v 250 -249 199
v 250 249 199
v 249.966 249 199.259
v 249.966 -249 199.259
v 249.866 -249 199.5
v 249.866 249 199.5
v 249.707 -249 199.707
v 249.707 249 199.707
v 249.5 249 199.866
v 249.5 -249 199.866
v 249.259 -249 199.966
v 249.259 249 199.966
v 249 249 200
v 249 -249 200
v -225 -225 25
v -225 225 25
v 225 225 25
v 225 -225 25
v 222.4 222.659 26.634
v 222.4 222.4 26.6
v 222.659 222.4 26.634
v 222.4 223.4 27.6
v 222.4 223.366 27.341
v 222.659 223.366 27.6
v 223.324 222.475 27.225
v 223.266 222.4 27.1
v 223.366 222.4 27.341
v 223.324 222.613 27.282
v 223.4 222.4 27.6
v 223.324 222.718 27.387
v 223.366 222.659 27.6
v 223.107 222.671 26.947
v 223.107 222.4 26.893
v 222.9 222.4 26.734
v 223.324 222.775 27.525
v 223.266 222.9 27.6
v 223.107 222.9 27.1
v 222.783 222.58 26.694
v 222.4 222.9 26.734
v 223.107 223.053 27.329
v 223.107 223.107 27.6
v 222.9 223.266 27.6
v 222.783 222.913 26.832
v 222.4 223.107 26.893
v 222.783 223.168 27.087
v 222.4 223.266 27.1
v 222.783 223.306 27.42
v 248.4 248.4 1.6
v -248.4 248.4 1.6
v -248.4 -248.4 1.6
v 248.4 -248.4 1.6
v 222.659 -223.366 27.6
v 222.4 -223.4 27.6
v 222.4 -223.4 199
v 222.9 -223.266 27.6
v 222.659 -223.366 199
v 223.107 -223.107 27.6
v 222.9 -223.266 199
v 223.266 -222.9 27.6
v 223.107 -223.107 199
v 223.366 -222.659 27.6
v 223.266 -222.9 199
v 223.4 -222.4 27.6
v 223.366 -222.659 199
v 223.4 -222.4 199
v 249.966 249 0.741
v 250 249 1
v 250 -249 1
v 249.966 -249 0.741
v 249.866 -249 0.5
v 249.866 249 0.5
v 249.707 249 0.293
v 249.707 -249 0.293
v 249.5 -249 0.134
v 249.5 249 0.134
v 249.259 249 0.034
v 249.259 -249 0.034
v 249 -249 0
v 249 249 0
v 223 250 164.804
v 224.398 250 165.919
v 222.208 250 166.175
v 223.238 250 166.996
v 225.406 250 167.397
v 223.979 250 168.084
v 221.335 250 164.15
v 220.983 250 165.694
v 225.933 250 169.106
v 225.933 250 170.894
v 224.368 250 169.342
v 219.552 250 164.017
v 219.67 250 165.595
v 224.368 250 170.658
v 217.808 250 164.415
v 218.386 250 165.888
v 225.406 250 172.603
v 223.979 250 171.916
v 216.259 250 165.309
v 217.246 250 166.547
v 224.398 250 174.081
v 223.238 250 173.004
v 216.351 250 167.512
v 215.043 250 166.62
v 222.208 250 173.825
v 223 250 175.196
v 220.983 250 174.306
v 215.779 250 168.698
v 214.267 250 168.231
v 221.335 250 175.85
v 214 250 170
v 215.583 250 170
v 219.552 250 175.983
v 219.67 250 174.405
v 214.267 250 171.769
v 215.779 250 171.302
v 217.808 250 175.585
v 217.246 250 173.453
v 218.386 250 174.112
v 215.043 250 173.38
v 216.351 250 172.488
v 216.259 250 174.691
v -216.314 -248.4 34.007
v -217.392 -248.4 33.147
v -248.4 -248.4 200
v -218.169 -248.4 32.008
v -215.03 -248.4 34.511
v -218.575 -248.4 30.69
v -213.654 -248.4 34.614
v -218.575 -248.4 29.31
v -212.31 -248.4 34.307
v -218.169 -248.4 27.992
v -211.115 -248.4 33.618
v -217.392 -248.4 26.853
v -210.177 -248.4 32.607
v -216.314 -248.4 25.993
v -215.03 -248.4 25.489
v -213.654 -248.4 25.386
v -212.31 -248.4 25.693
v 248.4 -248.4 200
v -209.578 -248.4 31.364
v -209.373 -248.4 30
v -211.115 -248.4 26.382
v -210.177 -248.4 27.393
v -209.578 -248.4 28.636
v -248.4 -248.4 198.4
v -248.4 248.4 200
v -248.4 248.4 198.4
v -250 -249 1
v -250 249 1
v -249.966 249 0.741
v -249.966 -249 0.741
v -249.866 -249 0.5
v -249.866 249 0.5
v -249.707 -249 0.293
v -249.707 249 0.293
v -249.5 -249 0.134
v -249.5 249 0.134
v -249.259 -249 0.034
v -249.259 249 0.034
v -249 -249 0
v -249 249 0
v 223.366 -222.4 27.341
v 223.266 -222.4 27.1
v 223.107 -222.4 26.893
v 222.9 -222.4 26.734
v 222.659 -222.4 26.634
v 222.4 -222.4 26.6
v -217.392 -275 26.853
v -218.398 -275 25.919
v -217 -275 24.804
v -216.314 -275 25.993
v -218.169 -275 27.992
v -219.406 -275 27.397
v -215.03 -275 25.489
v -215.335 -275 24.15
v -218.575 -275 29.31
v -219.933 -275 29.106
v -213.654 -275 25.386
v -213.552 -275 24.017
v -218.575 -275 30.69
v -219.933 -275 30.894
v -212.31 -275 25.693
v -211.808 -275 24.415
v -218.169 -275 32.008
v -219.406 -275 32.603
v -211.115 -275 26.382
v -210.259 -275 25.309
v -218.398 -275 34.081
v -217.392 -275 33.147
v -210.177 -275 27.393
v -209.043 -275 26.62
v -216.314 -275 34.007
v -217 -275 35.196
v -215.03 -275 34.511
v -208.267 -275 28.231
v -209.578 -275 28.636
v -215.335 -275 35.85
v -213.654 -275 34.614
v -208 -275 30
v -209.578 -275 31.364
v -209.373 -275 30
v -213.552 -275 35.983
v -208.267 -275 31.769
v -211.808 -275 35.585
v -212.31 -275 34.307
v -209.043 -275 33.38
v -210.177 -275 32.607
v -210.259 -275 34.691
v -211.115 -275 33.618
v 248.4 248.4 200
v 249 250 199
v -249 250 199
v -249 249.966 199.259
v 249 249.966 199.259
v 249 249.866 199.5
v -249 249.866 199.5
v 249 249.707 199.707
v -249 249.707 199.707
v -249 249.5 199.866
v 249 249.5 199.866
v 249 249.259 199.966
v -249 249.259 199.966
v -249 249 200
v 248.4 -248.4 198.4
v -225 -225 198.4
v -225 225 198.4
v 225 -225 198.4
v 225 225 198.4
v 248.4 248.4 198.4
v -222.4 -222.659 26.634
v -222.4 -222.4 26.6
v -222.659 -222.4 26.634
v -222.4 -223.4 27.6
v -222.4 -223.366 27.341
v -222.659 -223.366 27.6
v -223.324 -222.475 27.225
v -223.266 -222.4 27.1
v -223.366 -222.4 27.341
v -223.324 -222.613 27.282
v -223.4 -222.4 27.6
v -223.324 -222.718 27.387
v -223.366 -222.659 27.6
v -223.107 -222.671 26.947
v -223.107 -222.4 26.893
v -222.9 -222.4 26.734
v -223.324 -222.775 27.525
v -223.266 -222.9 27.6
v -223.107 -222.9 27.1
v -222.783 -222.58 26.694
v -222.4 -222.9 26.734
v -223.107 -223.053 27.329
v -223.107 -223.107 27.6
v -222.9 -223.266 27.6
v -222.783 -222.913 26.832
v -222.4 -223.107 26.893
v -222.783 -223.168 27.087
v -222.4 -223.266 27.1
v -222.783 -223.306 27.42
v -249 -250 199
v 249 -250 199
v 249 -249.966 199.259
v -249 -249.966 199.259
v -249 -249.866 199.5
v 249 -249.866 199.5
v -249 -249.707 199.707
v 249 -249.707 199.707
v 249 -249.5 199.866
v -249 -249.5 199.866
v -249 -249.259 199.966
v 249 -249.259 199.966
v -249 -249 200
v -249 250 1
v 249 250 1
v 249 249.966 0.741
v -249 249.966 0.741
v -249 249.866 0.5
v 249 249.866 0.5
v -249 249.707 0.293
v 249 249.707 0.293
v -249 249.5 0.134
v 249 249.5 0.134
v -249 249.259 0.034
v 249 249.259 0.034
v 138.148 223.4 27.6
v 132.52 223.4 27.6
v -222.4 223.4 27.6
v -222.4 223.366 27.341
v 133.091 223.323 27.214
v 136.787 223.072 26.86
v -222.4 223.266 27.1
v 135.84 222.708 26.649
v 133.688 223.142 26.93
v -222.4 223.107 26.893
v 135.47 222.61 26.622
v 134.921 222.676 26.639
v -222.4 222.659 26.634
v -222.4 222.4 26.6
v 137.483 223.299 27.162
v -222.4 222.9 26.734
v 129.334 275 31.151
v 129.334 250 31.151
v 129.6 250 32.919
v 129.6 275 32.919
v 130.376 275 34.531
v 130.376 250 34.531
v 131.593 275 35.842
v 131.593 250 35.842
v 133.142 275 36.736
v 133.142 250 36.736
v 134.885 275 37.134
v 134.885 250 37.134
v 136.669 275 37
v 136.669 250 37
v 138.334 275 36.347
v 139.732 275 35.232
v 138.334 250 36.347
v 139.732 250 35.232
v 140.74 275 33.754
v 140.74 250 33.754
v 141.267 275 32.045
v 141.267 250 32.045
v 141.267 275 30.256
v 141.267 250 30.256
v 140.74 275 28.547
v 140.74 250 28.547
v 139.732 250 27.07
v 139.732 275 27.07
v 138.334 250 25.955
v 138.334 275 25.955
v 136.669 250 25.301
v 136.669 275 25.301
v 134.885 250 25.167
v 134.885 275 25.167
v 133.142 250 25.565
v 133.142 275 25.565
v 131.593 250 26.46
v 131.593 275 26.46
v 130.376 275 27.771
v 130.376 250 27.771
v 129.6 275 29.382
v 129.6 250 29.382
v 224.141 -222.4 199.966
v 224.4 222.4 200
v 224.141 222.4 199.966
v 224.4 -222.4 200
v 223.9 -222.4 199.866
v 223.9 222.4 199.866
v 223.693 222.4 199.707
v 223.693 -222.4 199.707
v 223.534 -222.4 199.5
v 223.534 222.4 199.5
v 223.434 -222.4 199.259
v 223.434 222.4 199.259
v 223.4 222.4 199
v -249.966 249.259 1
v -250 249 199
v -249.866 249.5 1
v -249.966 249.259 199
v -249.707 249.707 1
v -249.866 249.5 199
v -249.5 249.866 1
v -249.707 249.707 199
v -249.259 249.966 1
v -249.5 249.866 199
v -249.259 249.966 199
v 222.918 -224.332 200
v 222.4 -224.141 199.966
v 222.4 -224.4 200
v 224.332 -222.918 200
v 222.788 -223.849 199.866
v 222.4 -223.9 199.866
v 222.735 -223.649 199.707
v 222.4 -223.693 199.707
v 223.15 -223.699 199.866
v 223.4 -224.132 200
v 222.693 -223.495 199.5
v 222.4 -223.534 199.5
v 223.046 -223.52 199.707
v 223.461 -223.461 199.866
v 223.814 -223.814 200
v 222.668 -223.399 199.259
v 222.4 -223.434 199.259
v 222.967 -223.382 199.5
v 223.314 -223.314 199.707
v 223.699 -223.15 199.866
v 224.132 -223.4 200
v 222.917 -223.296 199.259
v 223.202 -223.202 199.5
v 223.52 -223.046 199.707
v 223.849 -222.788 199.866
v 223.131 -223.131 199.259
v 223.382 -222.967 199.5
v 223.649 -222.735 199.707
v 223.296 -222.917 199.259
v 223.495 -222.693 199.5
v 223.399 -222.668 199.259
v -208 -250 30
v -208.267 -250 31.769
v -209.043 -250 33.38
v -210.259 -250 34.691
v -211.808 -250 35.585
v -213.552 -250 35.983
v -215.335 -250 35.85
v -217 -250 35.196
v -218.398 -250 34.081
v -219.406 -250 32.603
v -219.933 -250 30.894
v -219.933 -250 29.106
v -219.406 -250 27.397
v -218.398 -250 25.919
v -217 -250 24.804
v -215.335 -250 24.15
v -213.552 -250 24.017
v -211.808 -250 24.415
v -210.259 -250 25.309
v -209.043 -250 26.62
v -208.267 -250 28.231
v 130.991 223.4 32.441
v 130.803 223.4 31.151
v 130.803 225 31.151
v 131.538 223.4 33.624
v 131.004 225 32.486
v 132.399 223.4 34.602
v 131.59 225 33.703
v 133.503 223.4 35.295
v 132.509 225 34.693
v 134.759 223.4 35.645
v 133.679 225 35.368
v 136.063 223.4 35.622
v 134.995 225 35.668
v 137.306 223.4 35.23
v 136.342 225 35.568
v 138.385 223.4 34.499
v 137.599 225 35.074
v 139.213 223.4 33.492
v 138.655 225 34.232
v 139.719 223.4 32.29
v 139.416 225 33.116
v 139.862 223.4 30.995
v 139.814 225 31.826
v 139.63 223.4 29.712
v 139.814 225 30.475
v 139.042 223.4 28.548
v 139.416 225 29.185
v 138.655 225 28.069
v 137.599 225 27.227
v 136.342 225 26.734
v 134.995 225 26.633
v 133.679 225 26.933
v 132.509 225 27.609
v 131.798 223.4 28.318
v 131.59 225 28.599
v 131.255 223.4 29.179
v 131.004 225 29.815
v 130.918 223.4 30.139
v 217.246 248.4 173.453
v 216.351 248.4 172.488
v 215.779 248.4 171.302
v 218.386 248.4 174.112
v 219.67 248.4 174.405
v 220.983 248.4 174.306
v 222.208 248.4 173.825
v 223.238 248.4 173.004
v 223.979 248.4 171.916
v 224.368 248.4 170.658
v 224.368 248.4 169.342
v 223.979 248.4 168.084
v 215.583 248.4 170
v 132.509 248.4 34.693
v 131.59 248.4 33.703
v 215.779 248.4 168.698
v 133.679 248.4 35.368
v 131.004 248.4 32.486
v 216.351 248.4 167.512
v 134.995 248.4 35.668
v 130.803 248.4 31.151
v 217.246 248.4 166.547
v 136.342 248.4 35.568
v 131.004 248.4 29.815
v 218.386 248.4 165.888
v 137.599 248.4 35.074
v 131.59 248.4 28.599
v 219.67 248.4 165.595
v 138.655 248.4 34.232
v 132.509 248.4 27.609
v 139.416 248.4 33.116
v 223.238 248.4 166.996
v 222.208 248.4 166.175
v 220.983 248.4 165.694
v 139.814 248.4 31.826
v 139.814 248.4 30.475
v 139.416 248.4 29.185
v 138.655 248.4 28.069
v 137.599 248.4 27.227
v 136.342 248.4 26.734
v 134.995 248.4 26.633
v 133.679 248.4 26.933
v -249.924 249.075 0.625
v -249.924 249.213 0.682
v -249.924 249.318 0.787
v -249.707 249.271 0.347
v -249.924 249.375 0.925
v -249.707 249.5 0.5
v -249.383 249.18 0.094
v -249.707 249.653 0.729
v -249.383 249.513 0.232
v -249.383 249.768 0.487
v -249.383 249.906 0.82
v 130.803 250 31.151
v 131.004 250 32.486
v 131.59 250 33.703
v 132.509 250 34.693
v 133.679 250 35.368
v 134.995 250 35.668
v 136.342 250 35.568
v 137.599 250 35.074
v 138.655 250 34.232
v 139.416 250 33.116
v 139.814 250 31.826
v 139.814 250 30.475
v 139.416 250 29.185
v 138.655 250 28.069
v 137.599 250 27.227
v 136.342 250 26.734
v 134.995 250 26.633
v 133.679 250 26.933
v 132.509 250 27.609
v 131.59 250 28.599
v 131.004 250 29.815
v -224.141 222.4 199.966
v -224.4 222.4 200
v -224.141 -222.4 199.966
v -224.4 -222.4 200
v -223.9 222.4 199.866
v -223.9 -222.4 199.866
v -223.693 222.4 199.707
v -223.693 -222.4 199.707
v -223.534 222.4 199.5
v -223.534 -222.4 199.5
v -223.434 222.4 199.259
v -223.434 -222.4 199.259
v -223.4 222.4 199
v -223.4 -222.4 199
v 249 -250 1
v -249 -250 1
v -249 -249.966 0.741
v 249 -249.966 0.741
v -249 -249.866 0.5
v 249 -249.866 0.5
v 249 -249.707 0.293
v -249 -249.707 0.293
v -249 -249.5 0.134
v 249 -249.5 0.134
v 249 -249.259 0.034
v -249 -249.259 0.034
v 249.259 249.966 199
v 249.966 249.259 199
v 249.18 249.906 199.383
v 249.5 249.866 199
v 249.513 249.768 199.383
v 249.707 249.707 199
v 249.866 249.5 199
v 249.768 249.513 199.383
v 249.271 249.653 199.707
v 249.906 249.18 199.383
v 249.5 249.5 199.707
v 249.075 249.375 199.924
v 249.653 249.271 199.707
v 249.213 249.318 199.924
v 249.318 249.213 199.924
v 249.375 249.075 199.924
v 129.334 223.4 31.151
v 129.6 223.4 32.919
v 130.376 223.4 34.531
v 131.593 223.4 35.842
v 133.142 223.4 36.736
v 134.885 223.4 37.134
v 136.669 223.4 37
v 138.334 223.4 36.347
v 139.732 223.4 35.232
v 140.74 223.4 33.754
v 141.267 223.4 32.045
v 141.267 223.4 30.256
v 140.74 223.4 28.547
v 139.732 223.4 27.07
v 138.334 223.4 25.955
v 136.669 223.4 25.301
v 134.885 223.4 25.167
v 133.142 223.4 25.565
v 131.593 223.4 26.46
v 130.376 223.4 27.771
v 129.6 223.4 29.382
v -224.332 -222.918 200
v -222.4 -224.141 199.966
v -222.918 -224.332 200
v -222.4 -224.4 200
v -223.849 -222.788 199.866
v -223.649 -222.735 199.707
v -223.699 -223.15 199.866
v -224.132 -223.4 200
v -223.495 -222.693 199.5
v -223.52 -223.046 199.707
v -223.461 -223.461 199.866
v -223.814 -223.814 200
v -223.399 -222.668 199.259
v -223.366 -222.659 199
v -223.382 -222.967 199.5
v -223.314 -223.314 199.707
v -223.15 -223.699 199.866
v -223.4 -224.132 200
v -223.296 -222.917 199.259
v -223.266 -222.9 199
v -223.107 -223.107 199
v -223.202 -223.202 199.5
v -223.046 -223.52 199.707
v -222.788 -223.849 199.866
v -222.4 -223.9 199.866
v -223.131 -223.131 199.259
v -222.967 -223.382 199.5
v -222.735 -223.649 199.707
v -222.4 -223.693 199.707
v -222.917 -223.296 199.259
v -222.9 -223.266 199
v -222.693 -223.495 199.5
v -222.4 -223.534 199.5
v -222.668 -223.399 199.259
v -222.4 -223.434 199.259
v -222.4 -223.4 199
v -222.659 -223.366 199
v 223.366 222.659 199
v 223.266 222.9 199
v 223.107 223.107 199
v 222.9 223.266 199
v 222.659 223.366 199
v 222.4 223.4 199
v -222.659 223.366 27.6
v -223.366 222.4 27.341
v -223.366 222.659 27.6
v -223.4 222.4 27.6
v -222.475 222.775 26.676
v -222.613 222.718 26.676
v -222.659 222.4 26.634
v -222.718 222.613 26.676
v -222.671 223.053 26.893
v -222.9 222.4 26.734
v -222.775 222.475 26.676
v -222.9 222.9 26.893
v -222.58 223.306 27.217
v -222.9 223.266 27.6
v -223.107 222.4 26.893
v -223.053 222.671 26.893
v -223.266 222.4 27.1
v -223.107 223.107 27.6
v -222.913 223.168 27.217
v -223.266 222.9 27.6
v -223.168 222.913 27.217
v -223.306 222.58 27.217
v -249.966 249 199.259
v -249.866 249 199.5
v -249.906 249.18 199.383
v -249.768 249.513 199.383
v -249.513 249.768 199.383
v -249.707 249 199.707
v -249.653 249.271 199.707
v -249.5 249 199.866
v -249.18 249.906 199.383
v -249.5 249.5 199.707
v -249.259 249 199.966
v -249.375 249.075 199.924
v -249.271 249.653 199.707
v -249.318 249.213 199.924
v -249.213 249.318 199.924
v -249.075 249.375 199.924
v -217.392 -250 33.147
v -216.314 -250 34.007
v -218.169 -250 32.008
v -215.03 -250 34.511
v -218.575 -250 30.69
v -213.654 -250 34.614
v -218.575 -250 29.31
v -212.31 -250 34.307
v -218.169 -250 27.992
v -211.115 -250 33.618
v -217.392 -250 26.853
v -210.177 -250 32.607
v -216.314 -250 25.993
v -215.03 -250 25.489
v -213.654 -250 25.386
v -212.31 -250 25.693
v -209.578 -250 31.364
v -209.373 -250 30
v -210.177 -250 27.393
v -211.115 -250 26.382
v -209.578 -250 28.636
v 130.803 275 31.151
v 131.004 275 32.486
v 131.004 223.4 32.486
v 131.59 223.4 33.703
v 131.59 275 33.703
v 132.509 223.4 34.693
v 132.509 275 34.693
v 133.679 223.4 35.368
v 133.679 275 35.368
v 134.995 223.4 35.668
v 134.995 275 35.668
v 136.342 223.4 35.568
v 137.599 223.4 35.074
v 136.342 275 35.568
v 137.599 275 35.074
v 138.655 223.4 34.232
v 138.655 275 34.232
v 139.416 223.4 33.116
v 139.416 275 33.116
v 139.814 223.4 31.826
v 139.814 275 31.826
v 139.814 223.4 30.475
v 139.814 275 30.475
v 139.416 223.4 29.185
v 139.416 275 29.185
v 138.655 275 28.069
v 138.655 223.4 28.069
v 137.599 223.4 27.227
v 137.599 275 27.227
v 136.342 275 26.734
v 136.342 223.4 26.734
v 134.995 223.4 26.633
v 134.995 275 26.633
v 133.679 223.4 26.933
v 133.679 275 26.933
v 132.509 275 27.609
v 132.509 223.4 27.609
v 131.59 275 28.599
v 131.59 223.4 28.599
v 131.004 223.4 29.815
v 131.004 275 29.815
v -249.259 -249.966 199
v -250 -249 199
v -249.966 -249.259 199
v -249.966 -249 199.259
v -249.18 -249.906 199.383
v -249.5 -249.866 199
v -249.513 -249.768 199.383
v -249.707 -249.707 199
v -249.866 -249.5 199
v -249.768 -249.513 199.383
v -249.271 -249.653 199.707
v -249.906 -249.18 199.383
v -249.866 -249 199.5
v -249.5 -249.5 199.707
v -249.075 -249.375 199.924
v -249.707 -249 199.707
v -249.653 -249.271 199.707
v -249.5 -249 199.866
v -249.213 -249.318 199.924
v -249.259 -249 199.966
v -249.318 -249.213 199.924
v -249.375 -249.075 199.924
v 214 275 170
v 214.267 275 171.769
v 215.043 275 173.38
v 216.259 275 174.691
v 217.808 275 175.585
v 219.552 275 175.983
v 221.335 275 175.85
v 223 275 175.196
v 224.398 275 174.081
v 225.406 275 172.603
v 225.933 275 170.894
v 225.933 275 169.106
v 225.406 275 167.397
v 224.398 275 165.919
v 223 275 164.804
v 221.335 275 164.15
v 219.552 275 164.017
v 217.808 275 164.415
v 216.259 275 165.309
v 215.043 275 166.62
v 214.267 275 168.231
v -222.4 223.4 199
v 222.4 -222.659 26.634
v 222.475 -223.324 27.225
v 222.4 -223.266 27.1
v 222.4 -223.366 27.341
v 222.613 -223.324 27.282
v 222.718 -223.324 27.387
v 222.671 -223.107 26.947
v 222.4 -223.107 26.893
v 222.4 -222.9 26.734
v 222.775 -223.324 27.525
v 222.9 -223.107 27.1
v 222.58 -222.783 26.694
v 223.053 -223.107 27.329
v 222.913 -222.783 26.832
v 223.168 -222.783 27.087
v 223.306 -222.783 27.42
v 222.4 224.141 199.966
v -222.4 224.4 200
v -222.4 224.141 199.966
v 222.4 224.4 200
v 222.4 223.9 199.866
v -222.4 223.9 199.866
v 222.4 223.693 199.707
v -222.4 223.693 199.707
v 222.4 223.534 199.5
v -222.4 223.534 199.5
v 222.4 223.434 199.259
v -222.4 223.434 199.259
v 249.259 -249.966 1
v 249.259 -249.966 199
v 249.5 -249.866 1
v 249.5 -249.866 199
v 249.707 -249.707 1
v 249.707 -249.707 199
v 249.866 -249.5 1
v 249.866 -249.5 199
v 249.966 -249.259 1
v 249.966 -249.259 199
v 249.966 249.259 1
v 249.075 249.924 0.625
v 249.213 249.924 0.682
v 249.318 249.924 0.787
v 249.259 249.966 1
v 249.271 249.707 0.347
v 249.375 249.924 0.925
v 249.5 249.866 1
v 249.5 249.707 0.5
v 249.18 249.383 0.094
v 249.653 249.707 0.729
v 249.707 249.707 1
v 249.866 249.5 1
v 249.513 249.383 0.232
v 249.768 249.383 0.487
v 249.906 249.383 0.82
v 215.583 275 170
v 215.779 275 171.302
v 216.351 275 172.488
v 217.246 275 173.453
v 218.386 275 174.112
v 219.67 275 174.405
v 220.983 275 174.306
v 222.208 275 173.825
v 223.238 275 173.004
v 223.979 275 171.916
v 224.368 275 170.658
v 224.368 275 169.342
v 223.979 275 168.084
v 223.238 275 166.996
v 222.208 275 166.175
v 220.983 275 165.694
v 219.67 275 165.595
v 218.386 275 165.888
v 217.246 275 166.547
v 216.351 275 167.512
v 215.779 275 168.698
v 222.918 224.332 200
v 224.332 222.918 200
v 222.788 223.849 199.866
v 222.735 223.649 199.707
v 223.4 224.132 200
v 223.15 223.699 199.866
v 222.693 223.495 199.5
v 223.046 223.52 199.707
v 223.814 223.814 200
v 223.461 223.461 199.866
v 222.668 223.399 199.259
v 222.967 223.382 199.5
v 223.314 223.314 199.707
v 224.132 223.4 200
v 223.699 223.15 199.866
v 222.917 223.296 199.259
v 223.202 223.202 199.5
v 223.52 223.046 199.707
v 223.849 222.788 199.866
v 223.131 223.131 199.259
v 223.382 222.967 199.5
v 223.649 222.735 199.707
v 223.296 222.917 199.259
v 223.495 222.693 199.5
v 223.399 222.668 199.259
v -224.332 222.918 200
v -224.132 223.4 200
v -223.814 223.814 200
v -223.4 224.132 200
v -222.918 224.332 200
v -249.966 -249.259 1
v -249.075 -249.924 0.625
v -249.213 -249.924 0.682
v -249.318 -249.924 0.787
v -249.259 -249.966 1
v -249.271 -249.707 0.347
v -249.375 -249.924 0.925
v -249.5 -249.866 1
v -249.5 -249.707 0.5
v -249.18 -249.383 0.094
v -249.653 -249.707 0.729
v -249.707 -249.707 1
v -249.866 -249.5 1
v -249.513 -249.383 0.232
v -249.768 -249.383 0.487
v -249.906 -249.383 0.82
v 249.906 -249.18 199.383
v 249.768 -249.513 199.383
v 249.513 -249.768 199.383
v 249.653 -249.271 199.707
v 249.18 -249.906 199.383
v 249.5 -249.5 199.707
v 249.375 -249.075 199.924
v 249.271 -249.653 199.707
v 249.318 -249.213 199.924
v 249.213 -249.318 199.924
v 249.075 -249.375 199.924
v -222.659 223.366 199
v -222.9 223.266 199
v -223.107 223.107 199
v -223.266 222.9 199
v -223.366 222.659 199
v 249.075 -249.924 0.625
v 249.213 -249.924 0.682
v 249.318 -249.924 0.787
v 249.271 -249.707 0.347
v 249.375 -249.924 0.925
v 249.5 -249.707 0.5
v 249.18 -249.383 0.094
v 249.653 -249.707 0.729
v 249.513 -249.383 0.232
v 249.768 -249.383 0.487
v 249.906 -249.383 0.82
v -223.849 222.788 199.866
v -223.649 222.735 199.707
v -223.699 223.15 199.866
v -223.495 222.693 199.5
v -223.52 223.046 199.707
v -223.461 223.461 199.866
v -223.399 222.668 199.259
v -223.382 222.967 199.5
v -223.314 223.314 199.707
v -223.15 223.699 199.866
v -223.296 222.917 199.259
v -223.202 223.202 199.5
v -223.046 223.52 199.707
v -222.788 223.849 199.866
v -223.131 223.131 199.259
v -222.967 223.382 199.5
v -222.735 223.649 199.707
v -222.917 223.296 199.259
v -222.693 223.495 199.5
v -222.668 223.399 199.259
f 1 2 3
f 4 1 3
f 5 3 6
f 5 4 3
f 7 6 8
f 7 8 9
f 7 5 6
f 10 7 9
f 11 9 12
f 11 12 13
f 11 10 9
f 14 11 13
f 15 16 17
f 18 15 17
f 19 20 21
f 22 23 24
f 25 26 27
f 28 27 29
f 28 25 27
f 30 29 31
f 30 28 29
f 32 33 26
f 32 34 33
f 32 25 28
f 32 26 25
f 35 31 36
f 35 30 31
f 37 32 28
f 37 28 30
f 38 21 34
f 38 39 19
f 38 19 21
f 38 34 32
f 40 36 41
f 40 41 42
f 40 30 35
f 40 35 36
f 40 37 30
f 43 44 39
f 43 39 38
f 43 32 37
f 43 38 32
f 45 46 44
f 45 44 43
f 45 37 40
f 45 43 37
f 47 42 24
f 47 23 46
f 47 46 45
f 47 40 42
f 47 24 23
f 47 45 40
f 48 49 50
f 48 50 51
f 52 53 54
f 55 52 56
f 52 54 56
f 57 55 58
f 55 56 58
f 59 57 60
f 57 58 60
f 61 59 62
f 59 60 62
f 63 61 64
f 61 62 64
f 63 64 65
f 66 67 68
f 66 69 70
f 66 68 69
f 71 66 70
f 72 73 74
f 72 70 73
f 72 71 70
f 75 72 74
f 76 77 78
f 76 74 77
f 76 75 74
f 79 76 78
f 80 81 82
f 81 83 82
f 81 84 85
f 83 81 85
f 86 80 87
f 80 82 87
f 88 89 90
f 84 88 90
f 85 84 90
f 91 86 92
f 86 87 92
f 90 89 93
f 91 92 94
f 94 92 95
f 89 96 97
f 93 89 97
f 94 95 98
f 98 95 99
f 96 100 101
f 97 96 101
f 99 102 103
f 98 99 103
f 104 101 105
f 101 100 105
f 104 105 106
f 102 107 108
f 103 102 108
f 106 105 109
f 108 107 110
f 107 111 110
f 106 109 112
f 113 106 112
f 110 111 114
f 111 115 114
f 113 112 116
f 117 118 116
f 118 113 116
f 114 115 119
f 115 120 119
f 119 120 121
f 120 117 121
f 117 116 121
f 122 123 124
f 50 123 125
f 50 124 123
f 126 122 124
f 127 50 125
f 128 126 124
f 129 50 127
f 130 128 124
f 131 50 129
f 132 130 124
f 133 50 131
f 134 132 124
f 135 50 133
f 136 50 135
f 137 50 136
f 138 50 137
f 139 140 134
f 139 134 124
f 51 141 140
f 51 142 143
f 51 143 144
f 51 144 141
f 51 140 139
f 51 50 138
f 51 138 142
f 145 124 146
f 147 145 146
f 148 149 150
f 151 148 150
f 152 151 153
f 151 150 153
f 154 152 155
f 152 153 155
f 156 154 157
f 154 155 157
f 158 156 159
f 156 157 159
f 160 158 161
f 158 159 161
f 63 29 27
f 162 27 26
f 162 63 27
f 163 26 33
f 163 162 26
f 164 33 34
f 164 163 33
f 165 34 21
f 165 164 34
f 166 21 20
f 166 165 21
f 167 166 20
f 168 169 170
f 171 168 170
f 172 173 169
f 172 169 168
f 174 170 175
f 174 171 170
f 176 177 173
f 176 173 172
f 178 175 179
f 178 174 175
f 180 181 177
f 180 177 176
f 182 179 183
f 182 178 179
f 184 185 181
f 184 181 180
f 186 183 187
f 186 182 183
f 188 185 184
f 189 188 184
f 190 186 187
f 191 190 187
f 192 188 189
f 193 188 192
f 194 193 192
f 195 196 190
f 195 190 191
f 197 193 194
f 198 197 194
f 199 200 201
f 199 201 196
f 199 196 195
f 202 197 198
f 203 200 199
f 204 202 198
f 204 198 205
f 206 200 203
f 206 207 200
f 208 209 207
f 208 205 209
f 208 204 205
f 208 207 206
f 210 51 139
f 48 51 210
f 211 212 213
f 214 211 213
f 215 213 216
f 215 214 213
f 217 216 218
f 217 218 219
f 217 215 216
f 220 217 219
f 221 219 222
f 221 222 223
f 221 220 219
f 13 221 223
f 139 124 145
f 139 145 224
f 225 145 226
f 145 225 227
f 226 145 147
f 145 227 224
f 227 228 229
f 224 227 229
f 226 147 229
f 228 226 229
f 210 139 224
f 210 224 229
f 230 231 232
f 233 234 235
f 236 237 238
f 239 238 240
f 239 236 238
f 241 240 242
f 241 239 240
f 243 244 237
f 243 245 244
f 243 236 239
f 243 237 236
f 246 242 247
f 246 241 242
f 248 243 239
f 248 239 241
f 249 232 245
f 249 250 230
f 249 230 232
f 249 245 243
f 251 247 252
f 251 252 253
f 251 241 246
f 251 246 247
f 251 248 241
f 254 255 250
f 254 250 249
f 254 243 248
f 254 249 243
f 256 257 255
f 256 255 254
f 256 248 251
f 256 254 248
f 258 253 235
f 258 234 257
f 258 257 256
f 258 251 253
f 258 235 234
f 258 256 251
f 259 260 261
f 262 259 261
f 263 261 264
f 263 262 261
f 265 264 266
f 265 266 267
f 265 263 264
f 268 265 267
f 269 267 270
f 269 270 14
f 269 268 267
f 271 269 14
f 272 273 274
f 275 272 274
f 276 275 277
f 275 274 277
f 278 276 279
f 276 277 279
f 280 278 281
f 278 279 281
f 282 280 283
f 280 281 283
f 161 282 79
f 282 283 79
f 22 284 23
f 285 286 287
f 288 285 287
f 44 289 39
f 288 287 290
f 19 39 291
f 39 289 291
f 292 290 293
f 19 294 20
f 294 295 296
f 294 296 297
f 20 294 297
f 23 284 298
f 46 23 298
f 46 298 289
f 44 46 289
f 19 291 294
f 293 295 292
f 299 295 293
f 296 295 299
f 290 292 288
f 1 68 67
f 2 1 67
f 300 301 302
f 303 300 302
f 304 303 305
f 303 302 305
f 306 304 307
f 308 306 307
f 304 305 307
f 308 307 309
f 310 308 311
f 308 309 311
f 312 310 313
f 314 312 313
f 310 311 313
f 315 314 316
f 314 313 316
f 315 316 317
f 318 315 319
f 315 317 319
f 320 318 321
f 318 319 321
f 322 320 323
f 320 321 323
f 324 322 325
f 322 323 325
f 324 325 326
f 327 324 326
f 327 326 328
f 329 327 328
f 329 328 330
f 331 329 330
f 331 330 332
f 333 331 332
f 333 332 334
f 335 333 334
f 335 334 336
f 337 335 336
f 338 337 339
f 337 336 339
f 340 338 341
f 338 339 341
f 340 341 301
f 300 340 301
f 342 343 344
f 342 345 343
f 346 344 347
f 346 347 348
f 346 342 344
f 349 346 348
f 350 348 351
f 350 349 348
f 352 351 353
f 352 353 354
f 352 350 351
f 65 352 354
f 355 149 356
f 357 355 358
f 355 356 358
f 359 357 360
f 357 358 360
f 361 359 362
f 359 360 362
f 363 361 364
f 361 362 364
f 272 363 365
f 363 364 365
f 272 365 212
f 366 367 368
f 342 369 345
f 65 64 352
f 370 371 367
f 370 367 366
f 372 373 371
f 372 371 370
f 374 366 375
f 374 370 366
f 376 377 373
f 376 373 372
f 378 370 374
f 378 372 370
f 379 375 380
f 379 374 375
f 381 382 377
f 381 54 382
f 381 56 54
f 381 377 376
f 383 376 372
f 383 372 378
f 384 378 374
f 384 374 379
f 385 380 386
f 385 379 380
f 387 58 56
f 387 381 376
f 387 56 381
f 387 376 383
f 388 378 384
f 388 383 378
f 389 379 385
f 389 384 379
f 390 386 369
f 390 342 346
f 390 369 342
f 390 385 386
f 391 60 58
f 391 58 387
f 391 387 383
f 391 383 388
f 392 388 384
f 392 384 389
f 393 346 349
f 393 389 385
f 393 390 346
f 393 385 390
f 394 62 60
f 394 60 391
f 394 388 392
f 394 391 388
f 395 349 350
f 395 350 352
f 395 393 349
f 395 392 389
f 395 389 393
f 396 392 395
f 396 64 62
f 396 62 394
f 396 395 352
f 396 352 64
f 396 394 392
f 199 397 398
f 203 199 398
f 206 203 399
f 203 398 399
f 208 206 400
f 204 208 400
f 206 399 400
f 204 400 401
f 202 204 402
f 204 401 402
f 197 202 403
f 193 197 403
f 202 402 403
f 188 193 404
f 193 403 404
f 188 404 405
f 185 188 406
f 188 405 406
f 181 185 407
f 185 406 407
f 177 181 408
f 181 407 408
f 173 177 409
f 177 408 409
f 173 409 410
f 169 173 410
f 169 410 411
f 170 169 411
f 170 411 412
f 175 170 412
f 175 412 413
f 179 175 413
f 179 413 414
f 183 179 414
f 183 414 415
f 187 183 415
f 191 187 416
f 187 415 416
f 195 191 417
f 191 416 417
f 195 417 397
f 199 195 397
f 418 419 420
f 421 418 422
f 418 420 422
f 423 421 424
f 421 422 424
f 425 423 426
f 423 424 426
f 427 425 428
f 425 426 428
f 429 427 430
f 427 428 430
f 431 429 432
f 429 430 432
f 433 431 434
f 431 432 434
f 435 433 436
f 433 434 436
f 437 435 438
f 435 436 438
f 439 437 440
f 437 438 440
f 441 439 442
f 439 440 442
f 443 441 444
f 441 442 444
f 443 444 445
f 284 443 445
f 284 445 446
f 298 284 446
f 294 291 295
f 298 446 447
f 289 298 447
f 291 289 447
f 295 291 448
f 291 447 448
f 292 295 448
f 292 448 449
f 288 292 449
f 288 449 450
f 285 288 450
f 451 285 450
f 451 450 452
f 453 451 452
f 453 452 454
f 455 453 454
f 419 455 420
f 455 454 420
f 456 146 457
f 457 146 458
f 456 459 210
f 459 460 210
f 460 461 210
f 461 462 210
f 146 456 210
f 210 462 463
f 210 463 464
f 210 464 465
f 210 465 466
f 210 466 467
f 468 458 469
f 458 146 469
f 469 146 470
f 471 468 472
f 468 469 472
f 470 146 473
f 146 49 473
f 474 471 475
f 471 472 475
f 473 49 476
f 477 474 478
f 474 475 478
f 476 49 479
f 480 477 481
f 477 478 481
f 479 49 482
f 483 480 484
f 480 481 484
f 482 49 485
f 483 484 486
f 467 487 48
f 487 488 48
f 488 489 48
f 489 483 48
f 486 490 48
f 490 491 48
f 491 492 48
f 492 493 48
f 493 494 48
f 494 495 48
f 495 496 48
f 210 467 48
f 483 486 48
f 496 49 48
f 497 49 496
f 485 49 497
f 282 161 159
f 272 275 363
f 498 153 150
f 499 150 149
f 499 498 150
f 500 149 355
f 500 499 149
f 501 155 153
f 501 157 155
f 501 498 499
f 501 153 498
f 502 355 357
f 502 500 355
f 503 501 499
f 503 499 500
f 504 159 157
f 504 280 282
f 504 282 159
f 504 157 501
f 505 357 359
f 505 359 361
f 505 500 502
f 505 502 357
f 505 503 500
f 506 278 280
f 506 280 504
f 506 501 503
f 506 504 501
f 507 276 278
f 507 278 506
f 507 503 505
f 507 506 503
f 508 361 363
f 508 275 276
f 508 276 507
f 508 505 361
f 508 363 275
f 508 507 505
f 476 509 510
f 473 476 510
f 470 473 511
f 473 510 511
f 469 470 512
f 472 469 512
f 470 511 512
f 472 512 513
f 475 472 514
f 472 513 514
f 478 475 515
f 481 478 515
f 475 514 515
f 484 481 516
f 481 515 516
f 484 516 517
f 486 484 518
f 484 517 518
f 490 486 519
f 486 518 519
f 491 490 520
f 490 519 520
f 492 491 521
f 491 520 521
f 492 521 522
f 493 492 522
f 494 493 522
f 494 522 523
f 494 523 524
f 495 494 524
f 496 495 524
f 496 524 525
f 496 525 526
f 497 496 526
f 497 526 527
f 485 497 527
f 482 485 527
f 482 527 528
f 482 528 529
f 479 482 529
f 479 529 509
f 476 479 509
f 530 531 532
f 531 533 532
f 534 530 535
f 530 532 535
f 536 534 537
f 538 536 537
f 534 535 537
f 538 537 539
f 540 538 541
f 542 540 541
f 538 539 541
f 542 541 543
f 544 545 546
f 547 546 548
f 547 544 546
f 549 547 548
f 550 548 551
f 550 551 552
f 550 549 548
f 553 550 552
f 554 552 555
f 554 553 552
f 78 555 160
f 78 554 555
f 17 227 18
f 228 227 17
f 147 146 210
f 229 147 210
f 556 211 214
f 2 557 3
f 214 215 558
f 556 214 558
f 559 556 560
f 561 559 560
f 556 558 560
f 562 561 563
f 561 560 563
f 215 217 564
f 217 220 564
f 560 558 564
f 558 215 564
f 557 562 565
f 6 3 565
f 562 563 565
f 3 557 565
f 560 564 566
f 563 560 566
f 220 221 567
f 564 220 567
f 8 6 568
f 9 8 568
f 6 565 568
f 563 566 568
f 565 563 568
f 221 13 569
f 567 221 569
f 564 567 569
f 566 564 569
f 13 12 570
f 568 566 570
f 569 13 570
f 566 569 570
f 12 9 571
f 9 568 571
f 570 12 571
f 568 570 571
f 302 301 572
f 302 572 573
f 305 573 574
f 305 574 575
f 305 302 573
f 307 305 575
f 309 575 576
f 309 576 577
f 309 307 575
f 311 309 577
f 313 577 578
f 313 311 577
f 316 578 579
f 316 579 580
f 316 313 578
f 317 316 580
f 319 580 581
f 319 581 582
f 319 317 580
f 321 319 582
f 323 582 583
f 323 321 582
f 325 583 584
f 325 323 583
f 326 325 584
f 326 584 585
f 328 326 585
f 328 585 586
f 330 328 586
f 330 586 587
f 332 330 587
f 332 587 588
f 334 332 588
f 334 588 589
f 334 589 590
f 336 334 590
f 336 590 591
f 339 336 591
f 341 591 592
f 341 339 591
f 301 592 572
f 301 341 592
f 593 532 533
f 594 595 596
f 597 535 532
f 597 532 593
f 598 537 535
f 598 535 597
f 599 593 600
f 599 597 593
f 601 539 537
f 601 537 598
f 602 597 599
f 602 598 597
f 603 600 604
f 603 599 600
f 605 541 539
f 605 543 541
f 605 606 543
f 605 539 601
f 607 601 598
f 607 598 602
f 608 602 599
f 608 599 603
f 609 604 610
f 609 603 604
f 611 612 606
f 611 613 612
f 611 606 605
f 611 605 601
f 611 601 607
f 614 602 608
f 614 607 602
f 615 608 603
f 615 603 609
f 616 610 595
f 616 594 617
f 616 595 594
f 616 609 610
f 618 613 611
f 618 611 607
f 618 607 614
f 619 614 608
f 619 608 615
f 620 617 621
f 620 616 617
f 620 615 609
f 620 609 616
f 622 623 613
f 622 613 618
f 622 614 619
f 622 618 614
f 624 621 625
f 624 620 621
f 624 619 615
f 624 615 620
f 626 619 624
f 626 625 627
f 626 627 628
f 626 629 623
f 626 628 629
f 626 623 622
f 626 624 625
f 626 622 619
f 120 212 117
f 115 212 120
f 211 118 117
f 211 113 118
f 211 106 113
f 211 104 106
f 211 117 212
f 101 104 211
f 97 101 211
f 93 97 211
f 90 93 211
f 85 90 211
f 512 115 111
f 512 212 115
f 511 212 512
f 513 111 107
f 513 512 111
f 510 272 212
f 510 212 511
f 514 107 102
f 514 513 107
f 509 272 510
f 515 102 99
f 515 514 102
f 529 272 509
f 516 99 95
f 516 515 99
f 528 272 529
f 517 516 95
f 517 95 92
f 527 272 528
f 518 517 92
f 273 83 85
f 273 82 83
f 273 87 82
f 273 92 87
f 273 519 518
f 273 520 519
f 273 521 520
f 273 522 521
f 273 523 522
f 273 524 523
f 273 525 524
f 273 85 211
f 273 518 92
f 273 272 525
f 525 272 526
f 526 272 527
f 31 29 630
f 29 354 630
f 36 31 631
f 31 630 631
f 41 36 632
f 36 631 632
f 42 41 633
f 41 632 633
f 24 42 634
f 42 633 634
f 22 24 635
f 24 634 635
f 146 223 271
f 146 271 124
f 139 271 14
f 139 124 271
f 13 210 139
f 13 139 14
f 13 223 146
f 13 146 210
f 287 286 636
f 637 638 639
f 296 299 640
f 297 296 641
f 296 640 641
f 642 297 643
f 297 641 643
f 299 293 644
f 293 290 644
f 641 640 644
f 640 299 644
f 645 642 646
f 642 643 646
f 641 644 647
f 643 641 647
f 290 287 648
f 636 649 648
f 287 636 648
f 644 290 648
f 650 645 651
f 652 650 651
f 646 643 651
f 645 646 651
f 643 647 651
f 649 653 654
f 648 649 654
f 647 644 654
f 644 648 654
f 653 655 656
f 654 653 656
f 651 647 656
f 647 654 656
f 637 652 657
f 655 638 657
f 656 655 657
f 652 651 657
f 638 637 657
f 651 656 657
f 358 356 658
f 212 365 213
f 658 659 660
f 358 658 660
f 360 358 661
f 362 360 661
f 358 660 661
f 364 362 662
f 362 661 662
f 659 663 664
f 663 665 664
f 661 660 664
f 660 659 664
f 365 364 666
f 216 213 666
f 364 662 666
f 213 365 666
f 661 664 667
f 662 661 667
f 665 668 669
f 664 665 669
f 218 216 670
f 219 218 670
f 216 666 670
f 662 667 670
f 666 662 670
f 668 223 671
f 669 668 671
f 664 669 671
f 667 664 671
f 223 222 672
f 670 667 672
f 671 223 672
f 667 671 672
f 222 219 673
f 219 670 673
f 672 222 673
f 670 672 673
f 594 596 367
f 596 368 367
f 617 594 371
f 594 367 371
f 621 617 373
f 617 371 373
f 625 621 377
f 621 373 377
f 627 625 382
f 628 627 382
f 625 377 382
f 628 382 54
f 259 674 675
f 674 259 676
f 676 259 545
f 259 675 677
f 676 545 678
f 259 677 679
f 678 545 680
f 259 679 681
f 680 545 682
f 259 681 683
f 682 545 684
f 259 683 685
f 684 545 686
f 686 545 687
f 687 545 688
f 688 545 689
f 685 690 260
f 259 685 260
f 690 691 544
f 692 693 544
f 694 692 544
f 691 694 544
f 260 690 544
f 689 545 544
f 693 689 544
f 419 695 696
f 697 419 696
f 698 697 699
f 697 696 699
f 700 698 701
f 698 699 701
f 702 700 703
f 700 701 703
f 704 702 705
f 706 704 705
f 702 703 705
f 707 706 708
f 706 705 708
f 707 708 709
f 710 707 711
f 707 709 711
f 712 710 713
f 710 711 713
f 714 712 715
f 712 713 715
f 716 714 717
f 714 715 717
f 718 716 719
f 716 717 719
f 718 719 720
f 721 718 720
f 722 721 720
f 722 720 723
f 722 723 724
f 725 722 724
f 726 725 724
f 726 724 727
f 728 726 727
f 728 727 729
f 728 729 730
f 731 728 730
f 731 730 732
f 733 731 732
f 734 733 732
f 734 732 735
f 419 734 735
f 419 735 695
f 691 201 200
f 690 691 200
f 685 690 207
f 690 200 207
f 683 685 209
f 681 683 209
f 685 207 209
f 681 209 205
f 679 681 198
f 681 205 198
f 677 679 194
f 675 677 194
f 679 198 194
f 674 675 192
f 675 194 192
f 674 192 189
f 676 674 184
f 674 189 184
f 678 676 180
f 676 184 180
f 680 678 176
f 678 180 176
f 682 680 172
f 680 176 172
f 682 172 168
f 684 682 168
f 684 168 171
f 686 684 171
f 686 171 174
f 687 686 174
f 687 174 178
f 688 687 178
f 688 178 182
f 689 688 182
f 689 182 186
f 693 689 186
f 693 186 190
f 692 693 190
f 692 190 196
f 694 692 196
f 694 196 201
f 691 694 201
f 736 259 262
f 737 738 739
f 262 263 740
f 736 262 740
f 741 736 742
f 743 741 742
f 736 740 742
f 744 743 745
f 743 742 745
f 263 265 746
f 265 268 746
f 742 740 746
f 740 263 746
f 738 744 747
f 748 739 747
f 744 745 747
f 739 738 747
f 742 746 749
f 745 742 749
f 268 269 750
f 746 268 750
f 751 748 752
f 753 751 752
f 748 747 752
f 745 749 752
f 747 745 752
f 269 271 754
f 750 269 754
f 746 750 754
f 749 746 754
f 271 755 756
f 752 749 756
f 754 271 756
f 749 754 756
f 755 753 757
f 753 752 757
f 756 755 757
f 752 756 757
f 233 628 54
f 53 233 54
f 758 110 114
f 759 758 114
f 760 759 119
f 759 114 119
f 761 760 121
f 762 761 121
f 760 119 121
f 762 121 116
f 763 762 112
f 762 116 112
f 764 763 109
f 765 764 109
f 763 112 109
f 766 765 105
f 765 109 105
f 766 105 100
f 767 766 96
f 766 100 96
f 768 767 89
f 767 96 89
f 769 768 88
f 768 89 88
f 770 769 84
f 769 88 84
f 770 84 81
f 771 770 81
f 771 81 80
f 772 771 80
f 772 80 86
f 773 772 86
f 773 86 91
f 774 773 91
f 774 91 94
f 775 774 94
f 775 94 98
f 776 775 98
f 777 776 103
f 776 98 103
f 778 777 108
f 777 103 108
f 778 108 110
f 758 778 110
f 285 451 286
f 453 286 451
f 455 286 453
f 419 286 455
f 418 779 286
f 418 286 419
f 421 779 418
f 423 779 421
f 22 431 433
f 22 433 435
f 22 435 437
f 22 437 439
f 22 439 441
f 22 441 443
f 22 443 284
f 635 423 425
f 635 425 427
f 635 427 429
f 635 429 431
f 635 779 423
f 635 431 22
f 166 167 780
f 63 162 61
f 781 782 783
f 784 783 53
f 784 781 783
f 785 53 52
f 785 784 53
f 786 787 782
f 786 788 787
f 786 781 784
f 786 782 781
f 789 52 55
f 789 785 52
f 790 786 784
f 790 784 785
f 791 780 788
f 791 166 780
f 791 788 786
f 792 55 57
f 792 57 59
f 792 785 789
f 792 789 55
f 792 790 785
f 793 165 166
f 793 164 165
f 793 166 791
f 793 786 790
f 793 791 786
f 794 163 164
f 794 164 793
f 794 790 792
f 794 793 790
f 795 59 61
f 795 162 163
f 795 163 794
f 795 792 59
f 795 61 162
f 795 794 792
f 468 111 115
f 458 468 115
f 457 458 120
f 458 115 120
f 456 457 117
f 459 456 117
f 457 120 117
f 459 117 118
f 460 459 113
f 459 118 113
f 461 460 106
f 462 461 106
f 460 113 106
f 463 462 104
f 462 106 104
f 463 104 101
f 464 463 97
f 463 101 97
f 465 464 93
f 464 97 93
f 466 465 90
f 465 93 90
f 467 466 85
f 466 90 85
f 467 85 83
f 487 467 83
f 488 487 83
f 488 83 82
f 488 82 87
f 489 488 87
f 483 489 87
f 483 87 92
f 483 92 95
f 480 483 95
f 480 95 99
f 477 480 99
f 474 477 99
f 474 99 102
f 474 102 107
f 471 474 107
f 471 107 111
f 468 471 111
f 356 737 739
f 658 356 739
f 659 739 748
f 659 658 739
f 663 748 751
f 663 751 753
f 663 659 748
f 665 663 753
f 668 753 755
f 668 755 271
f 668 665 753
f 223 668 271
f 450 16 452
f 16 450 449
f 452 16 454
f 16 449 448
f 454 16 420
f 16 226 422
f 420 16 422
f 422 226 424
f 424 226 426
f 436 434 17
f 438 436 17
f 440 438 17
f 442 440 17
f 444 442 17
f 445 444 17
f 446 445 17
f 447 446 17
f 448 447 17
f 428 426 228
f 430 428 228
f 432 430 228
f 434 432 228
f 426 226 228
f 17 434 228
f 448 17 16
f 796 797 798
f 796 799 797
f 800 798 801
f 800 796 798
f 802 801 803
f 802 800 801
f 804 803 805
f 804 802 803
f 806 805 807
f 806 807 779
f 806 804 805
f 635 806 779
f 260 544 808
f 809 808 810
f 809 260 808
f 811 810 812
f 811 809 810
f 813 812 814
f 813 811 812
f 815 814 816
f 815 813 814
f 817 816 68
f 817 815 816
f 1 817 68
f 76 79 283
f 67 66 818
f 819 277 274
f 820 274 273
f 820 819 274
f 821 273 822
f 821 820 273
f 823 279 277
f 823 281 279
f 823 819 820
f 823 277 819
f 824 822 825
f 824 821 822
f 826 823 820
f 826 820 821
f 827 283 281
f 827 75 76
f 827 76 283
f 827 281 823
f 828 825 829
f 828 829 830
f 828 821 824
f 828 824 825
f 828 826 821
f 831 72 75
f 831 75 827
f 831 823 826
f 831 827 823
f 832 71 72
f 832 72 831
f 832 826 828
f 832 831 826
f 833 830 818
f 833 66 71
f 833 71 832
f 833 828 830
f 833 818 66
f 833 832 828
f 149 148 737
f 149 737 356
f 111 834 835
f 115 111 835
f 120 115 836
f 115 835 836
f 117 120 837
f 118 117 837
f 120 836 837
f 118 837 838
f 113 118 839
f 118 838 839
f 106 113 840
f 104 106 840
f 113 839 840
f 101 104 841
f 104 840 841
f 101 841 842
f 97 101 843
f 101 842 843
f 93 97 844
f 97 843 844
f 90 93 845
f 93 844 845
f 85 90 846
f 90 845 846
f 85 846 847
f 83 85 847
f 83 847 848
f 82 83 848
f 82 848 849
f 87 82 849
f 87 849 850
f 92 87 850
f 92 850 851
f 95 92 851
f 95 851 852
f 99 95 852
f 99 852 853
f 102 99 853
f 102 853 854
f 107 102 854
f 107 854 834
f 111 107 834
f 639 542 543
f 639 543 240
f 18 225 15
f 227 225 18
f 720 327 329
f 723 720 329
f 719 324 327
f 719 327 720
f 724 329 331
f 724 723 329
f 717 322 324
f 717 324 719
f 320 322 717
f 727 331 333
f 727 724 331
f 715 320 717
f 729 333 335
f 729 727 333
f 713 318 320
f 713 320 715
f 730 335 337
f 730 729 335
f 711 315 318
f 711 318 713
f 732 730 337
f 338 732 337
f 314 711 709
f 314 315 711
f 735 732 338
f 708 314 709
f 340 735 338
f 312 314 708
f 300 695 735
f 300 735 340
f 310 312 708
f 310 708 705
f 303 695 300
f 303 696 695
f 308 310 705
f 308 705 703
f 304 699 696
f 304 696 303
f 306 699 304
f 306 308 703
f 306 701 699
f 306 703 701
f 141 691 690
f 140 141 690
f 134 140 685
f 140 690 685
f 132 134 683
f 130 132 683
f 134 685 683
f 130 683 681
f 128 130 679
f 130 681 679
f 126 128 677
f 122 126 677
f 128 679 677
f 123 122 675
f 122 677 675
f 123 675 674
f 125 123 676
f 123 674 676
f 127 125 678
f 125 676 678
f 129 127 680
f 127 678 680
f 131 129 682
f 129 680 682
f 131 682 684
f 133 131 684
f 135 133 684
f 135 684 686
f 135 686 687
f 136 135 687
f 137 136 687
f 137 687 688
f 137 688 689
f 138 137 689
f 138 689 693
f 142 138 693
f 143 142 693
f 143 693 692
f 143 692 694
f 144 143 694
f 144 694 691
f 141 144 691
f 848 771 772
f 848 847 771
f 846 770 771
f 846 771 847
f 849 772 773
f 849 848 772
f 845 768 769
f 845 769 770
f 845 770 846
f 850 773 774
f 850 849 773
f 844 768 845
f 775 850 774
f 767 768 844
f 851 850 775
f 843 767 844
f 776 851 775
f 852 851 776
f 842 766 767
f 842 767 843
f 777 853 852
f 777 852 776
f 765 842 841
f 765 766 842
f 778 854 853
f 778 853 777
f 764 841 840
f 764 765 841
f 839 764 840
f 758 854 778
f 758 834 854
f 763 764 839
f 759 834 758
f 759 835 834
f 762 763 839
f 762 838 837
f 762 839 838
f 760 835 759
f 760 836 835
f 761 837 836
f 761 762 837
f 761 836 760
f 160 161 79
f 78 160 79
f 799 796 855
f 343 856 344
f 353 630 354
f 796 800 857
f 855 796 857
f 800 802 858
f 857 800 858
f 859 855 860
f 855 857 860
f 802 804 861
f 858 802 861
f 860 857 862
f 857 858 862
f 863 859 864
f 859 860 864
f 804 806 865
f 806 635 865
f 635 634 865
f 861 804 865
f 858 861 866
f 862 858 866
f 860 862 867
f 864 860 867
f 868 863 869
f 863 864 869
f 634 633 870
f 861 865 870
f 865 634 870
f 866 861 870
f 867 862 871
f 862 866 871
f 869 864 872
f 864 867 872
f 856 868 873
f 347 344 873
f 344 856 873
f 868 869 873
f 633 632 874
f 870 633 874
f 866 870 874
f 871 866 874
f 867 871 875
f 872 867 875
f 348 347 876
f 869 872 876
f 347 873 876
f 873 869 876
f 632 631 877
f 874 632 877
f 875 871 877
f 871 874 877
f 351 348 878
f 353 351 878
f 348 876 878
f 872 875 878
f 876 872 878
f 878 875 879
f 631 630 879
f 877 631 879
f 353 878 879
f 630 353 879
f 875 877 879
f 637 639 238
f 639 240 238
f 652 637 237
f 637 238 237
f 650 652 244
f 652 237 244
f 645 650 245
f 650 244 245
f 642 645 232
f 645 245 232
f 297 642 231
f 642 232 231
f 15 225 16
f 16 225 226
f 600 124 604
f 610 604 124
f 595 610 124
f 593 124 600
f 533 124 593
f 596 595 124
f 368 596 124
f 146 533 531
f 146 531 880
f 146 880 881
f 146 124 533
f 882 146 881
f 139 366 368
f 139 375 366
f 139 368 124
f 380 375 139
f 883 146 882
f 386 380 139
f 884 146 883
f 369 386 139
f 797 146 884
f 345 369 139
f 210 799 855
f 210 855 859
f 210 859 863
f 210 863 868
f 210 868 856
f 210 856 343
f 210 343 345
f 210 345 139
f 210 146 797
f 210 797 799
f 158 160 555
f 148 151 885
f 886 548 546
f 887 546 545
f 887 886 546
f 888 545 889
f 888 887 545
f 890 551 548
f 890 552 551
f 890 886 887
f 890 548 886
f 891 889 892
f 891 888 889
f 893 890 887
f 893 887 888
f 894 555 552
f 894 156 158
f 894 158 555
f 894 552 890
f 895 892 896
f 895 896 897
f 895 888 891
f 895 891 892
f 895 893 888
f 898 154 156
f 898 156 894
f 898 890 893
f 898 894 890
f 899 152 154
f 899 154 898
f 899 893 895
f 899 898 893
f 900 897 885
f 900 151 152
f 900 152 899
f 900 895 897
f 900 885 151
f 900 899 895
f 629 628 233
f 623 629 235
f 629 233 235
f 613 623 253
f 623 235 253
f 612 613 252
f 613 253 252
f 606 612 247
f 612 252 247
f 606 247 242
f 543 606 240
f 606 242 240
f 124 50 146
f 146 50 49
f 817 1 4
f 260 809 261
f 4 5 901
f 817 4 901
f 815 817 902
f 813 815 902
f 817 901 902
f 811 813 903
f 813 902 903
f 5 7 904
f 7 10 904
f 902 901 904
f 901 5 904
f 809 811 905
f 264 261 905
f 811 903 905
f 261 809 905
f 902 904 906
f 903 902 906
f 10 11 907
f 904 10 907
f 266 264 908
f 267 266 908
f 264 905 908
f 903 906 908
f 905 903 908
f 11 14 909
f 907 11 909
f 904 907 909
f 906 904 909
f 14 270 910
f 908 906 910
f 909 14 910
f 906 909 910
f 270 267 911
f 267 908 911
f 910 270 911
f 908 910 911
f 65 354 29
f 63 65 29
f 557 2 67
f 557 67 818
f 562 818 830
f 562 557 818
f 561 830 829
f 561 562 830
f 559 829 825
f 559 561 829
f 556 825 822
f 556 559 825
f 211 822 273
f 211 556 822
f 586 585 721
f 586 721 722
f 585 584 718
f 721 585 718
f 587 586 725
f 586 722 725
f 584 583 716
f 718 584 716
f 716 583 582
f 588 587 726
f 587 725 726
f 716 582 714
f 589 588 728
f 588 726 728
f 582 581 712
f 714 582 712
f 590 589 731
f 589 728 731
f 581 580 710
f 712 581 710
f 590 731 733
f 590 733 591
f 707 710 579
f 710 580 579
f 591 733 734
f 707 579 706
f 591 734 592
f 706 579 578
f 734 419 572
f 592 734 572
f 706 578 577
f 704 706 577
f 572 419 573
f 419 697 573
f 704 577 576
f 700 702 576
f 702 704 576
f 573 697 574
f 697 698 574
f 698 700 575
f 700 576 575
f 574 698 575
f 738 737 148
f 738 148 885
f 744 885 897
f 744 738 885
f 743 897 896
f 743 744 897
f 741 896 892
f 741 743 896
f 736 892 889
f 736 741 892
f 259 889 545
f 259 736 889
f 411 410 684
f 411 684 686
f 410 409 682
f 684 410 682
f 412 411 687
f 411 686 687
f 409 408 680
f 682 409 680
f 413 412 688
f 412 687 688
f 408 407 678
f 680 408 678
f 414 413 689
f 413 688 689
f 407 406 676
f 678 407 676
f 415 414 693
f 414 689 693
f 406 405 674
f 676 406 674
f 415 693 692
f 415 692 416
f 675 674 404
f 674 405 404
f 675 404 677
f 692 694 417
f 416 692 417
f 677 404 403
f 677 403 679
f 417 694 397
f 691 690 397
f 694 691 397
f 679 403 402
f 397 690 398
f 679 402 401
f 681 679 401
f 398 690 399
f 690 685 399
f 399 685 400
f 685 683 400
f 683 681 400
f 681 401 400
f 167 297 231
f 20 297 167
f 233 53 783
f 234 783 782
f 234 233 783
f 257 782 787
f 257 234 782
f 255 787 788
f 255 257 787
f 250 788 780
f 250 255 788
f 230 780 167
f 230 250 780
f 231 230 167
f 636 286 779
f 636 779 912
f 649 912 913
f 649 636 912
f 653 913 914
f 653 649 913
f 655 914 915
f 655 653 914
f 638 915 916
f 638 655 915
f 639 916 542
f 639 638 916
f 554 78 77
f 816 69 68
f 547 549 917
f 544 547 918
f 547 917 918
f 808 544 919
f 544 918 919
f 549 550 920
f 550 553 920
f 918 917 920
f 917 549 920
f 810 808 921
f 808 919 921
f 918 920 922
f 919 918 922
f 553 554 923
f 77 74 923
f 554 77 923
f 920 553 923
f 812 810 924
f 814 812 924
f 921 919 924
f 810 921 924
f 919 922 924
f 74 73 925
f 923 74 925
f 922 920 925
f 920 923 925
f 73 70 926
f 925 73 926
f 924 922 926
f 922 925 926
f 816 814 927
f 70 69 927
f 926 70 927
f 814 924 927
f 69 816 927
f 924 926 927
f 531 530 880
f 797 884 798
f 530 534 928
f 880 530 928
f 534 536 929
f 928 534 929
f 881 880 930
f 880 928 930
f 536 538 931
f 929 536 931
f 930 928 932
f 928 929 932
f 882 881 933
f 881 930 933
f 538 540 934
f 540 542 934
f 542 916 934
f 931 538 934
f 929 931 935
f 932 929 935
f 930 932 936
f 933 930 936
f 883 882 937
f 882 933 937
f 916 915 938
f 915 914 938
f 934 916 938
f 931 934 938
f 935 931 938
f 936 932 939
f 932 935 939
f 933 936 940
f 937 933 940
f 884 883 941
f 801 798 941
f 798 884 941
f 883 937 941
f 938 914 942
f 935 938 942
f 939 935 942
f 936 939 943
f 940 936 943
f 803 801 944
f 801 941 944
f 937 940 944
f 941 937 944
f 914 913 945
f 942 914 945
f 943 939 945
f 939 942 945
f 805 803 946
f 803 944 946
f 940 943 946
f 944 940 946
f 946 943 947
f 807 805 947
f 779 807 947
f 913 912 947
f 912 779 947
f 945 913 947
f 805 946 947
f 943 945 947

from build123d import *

# Parameters (mm, degrees)
F0_W           = 500
F0_H           = 500
F1_DEPTH       = 200
F2_R           = 1
F3_T           = -1.6
F4_W           = 496.8
F4_H           = 496.8
F4_W_2         = 450
F4_H_2         = 450
F5_DEPTH       = 1.6
F6_W           = 450
F6_H           = 450
F7_DEPTH       = 175
F8_T           = 1.6
F8_T3_DEPTH    = 453.2
F8_T5_DEPTH    = 453.2
F9_R           = 1
F9_2_R         = 1
F10_R          = 6
F11_DEPTH      = 25
F12_R          = 6
F13_DEPTH      = 25
F14_R          = 4.6271608876
F15_DEPTH      = 30
F16_R          = 4.4168784141
F17_DEPTH      = 30
F18_R          = 6
F19_DEPTH      = 26.6
F19_DEPTH_BACK = 25
F20_R          = 4.5305063865
F21_DEPTH      = 70


# Not quite as in the source:
# - a shell that OpenCascade refuses in one call is made with other operations: the cavity is built on its own and cut out


with BuildPart() as f1:
    # F0 (on Top) → F1 (new body)
    with BuildSketch(Plane.XY):
        Rectangle(F0_W, F0_H)
    extrude(amount=F1_DEPTH)

    # F2
    f2_edges = [f1.edges().sort_by_distance(p)[0] for p in [
        (250, 0, 0),
        (0, 250, 0),
        (-250, 0, 0),
        (0, -250, 0),
        (250, -250, 100),
        (-250, -250, 100),
        (-250, 250, 100),
        (250, 250, 100),
    ]]
    fillet(f2_edges, radius=F2_R)

    # F3
    f3_openings = [f1.faces().sort_by_distance(p)[0] for p in [
        (0, 0, 200),
    ]]
    offset(amount=F3_T, openings=f3_openings)

    # F9#2
    f9_2_edges = [f1.edges().sort_by_distance(p)[0] for p in [
        (-250, 0, 200),
        (0, -250, 200),
        (250, 0, 200),
        (0, 250, 200),
    ]]
    fillet(f9_2_edges, radius=F9_2_R)


with BuildPart() as f5:
    # F4 (on face) → F5 (new body)
    with BuildSketch(Plane.XY.offset(200)):
        Rectangle(F4_W, F4_H)
        Rectangle(F4_W_2, F4_H_2, mode=Mode.SUBTRACT)
    extrude(amount=-F5_DEPTH)

    # F6 (on face) → F7 (join)
    with BuildSketch(Plane.XY.offset(200)):
        Rectangle(F6_W, F6_H)
    extrude(amount=-F7_DEPTH)

    # F8: shell of thickness 1.6, made by hand


with BuildPart() as f8_core1:
    # F8_t2: copy of F5
    add(f5.part)

    # the walls: a layer under each face that stays
    f8_faces = [f8_core1.faces().sort_by_distance(p)[0] for p in [
        (248.4, 0, 199.2),
        (0, -248.4, 199.2),
        (0, 248.4, 199.2),
        (-231.84, -231.84, 198.4),
        (-248.4, 0, 199.2),
        (-225, 0, 111.7),
        (0, 225, 111.7),
        (225, 0, 111.7),
        (0, -225, 111.7),
        (0, 0, 25),
    ]]
    thicken(f8_faces, amount=-F8_T, mode=Mode.SUBTRACT)

    # F8_s4 → F8_t3 (cut)
    with BuildSketch(Plane.XZ.offset(-226.6)):
        Polygon((-225.016, 198.384), (-225, 200), (-223.4, 200), (-223.4, 198.4), align=None)
        Polygon((225.016, 198.384), (225, 200), (223.4, 200), (223.4, 198.4), align=None)
    extrude(amount=F8_T3_DEPTH, mode=Mode.SUBTRACT)

    # F8_s6 → F8_t5 (cut)
    with BuildSketch(Plane.YZ.offset(-226.6)):
        Polygon((225.016, 198.384), (225, 200), (223.4, 200), (223.4, 198.4), align=None)
        Polygon((-225.016, 198.384), (-225, 200), (-223.4, 200), (-223.4, 198.4), align=None)
    extrude(amount=F8_T5_DEPTH, mode=Mode.SUBTRACT)


with BuildPart() as f5_1:
    add(f5.part)

    # what is left inside the walls is the cavity
    f8_cavity = [f8_core1.part.solids().sort_by_distance(p)[0] for p in [
        (0, -74.466667, 199.984),
    ]]
    add(f8_cavity, mode=Mode.SUBTRACT)

    # F9
    f9_edges = [f5_1.edges().sort_by_distance(p)[0] for p in [
        (-223.4, 0, 200),
        (0, -223.4, 200),
        (0, 223.4, 200),
        (223.4, 0, 200),
        (-223.4, 223.4, 113.3),
        (0, 223.4, 26.6),
        (223.4, 0, 26.6),
        (0, -223.4, 26.6),
        (-223.4, 0, 26.6),
        (223.4, -223.4, 113.3),
        (-223.4, -223.4, 113.3),
        (223.4, 223.4, 113.3),
    ]]
    fillet(f9_edges, radius=F9_R)


with BuildPart() as f11:
    # F10 (on face) → F11 (new body)
    with BuildSketch(Plane(origin=(0, 250, 0), x_dir=(-1, 0, 0), z_dir=(0, 1, 0))):
        with Locations((-220, 170)):
            Circle(F10_R)
    extrude(amount=F11_DEPTH)


with BuildPart() as f13:
    # F12 (on face) → F13 (new body)
    with BuildSketch(Plane.XZ.offset(250)):
        with Locations((-214, 30)):
            Circle(F12_R)
    extrude(amount=F13_DEPTH)


with BuildPart() as f15_tool:
    # F14 (on face) → F15 (new body)
    with BuildSketch(Plane.XZ.offset(275)):
        with Locations((-214, 30)):
            Circle(F14_R)
    extrude(amount=-F15_DEPTH)


with BuildPart() as f1_1:
    add(f1.part)

    # F15: cut by f15_tool
    add(f15_tool.part, mode=Mode.SUBTRACT)


with BuildPart() as f13_1:
    add(f13.part)

    # F15: cut by f15_tool
    add(f15_tool.part, mode=Mode.SUBTRACT)


with BuildPart() as f17_tool:
    # F16 (on face) → F17 (new body)
    with BuildSketch(Plane(origin=(0, 275, 0), x_dir=(-1, 0, 0), z_dir=(0, 1, 0))):
        with Locations((-220, 170)):
            Circle(F16_R)
    extrude(amount=-F17_DEPTH)


with BuildPart() as f1_2:
    add(f1_1.part)

    # F17: cut by f17_tool
    add(f17_tool.part, mode=Mode.SUBTRACT)


with BuildPart() as f11_1:
    add(f11.part)

    # F17: cut by f17_tool
    add(f17_tool.part, mode=Mode.SUBTRACT)


with BuildPart() as f19:
    # F18 (on face) → F19 (new body, two sides)
    with BuildSketch(Plane(origin=(0, 250, 0), x_dir=(-1, 0, 0), z_dir=(0, 1, 0))) as f19_sk:
        with Locations((-135.3337168694, 31.1506576836)):
            Circle(F18_R)
    extrude(amount=-F19_DEPTH)
    extrude(f19_sk.sketch, amount=F19_DEPTH_BACK)


with BuildPart() as f21_tool:
    # F20 (on face) → F21 (new body)
    with BuildSketch(Plane(origin=(0, 275, 0), x_dir=(-1, 0, 0), z_dir=(0, 1, 0))):
        with Locations((-135.3337168694, 31.1506576836)):
            Circle(F20_R)
    extrude(amount=-F21_DEPTH)


with BuildPart() as f1_3:
    add(f1_2.part)

    # F21: cut by f21_tool
    add(f21_tool.part, mode=Mode.SUBTRACT)


with BuildPart() as f5_2:
    add(f5_1.part)

    # F21: cut by f21_tool
    add(f21_tool.part, mode=Mode.SUBTRACT)


with BuildPart() as f19_1:
    add(f19.part)

    # F21: cut by f21_tool
    add(f21_tool.part, mode=Mode.SUBTRACT)


solid = Compound([f13_1.part, f11_1.part, f1_3.part, f5_2.part, f19_1.part])
